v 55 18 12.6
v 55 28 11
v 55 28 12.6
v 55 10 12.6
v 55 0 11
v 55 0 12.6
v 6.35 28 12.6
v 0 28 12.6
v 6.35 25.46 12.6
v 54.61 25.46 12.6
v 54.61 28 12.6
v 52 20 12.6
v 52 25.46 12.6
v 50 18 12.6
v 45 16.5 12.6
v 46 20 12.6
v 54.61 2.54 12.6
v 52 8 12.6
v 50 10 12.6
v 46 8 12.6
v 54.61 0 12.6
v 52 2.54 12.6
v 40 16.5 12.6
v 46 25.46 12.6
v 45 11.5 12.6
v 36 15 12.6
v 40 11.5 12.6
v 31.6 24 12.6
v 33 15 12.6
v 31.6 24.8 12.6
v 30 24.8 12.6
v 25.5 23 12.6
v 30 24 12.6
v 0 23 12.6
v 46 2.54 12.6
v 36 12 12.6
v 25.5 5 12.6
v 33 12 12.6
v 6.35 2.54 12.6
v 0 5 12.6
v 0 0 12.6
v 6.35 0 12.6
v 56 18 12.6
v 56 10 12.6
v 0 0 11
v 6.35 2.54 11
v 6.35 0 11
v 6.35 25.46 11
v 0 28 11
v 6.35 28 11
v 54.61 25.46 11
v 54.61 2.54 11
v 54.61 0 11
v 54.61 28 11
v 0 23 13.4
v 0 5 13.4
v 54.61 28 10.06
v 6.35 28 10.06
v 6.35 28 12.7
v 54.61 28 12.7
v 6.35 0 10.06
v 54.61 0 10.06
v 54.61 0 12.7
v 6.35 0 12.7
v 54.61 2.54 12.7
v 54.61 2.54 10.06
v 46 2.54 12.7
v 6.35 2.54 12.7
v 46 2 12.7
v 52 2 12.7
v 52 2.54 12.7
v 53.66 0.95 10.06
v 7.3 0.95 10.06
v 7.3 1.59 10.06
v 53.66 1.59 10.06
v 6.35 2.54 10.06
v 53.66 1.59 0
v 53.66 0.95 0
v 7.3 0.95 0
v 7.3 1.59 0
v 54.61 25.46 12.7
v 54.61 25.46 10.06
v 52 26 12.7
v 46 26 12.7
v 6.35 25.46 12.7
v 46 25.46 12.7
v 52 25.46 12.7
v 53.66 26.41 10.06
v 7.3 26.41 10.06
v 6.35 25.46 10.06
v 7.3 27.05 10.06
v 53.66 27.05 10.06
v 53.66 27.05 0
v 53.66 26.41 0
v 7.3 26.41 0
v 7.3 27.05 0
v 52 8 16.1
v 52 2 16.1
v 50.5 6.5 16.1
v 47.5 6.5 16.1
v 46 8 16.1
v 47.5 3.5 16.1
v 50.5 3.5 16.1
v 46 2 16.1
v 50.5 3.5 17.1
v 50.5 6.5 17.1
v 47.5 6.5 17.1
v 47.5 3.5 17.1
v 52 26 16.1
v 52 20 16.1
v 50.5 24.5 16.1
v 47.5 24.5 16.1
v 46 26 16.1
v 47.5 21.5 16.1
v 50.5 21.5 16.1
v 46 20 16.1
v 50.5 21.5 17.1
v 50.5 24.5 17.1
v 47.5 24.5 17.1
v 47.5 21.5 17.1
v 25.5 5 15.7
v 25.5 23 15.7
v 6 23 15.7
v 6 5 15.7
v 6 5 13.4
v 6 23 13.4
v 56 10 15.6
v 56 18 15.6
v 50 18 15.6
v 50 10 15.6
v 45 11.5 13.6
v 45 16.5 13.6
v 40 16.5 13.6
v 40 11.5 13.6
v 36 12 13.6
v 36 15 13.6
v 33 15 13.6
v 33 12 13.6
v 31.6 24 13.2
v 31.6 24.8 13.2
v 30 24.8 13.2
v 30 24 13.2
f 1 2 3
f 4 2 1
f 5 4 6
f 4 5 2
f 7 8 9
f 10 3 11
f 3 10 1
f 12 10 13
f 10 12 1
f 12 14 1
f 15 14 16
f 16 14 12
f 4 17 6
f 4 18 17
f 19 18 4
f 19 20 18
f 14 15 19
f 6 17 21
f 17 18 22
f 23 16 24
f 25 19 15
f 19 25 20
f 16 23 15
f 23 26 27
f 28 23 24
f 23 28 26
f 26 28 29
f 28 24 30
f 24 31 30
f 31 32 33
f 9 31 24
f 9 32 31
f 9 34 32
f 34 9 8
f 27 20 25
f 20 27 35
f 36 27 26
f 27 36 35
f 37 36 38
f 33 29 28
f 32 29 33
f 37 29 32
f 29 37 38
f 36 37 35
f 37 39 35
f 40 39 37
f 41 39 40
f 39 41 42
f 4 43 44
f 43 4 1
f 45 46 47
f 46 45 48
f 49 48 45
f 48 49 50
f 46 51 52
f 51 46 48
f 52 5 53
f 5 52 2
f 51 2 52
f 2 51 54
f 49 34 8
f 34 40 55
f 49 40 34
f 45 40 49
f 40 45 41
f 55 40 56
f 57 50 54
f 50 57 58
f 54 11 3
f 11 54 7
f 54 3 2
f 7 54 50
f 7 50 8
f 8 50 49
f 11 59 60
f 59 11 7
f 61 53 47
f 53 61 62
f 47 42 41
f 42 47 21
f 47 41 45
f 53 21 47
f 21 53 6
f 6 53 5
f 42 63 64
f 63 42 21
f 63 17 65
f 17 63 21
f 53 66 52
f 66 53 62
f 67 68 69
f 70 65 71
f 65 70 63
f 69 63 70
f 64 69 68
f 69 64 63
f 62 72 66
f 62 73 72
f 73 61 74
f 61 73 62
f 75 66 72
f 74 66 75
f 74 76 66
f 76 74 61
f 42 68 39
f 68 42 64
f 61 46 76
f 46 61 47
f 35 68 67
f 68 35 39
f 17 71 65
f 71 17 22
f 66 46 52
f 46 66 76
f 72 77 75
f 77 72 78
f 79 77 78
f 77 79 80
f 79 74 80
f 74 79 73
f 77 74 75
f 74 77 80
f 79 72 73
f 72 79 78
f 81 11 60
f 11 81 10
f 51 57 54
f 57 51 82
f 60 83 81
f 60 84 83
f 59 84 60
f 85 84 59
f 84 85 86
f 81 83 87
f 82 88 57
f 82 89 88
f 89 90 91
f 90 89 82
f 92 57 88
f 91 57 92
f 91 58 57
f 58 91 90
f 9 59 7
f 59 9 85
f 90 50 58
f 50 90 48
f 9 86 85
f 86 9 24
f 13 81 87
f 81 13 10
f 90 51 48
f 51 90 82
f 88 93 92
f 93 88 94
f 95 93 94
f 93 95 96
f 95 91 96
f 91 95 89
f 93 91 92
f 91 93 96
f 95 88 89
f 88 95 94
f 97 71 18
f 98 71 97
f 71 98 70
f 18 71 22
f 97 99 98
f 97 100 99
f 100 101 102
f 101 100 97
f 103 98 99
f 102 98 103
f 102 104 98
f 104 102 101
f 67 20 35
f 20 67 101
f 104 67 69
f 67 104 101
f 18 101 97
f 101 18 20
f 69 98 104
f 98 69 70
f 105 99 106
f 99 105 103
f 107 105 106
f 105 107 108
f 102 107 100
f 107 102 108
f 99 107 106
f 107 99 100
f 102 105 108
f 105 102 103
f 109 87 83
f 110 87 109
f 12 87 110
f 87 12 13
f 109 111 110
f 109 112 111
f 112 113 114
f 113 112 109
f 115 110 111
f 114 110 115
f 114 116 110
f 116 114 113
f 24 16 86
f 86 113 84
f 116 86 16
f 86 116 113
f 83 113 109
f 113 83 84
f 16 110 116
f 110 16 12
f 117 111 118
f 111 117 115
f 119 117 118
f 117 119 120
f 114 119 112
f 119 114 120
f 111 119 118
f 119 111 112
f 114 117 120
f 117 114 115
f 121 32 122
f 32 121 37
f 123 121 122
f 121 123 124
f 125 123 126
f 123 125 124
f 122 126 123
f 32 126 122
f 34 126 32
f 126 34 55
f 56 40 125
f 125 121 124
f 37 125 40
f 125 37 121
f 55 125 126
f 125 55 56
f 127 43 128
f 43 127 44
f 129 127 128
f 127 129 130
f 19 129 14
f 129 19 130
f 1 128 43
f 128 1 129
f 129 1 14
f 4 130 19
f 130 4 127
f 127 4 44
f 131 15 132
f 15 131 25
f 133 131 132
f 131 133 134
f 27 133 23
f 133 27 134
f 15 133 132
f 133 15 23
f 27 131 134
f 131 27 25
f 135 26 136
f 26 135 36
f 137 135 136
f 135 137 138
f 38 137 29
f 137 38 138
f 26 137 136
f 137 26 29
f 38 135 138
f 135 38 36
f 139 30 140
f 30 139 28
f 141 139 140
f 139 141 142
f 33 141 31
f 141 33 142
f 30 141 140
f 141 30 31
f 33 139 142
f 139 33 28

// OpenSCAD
// file: ../board_common.scad
// What every board model here is made of: a PCB with holes, pin headers,
// chips and jacks, drawn from published dimensions. Nothing here is anyone's
// mesh; a board's outline, hole positions and connector placements are
// specifications the makers publish so that cases and shields can be made.
//
// Every board's origin is its PCB's front-left bottom corner (x right, y back,
// z up), with the PCB lying flat on z = 0 -- so a board placed at a node in
// a site sits on that node's floor, which is where a board sits on a bench.

pcb_t = 1.6;
pitch = 2.54;

module pcb(size, holes = [], hole_d = 3.2, col = "darkgreen") {
    color(col) difference() {
        cube([size.x, size.y, pcb_t]);
        for (h = holes) translate([h.x, h.y, -1]) cylinder(d = hole_d, h = pcb_t + 2, $fn = 16);
    }
}

// Pins are square posts that overlap what they stand in. OpenSCAD 2021.01
// exports a union with hexagonal pins, or with parts that only touch along
// an edge, as a mesh that is not closed -- and then drops it from any later
// union, silently. Every part here overlaps its neighbour by a little.
pin = 0.64;

// a row of `n` pins at the given start, along +x (or +y when `along_y`), with plastic bodies
module header(n, at, along_y = false, rows = 1, h = 8.5) {
    translate([at.x, at.y, pcb_t - 0.1]) rotate([0, 0, along_y ? 90 : 0]) translate([0, along_y ? -rows * pitch : 0, 0]) {
        color("black") cube([n * pitch, rows * pitch, h]);
        color("gold") for (i = [0 : n - 1]) for (r = [0 : rows - 1])
            translate([i * pitch + pitch / 2 - pin / 2, r * pitch + pitch / 2 - pin / 2, -3]) cube([pin, pin, h + 6]);
    }
}

// a row of `n` bare pins pointing down (a devkit standing on a breadboard).
// The pins are one gold strip, not n posts: n posts through a plastic bar
// under a PCB is a face with n holes, which OpenSCAD 2021.01 exports as a
// mesh CGAL will not read back. At bench scale a strip is a row of pins.
module pins_down(n, at, along_y = false, len = 11) {
    // one translate per solid, from the board's own frame: a chain of
    // translates with negative offsets rounds differently and the exporter
    // then writes a mesh CGAL will not read back (seen; not understood)
    rotate([0, 0, along_y ? 90 : 0]) {
        color("black") translate([at.x, at.y - pitch / 2, pcb_t - pitch]) cube([n * pitch, pitch, pitch + 0.1]);
        color("gold") translate([at.x + pitch / 2 - pin / 2, at.y - pin / 2, -len]) cube([(n - 1) * pitch + pin, pin, len + pcb_t - pitch + 0.2]);
    }
}

module chip(size, at, col = "black") { color(col) translate([at.x, at.y, pcb_t - 0.1]) cube([size.x, size.y, size.z + 0.1]); }

module usb_b(at) {           // a full-size USB-B jack, its face at the -x side
    color("silver") translate([at.x, at.y, pcb_t]) cube([16, 12, 11]);
}
module barrel_jack(at) {     // a 2.1 mm DC jack, its face at the -x side
    color("black") translate([at.x, at.y, pcb_t]) cube([14, 9, 11]);
}
module micro_usb(at, along_y = false) {
    color("silver") translate([at.x, at.y, pcb_t]) cube(along_y ? [8, 6, 3] : [6, 8, 3]);
}
module usb_c(at) { color("silver") translate([at.x, at.y, pcb_t]) cube([9, 7.5, 3.2]); }
module usb_a_stack(at) {     // two USB-A ports one above the other, the face at +x
    color("silver") translate([at.x, at.y, pcb_t]) cube([17.5, 13.2, 16]);
}
module rj45(at) { color("silver") translate([at.x, at.y, pcb_t]) cube([21.5, 16, 13.5]); }
module button(at) { color("silver") translate([at.x, at.y, pcb_t - 0.1]) cube([6, 6, 3.6]); color("black") translate([at.x + 1.5, at.y + 1.5, pcb_t + 3.4]) cube([3, 3, 1.1]); }
module crystal(at) { color("silver") translate([at.x, at.y, pcb_t]) cube([11, 4.5, 3.5]); }
module heatsink(at, size = [9, 9, 8]) { color("black") translate([at.x, at.y, pcb_t - 0.1]) cube([size.x, size.y, size.z + 4.1]); }
module screw_terminal(n, at, along_y = false) {
    translate([at.x, at.y, pcb_t]) rotate([0, 0, along_y ? 90 : 0]) color("mediumblue") cube([n * 5.08, 8, 10]);
}
module jst(n, at, along_y = false) {   // a JST-XH style header
    translate([at.x, at.y, pcb_t]) rotate([0, 0, along_y ? 90 : 0]) color("ivory") cube([n * 2.5 + 2.4, 5.8, 7]);
}
module sd_slot(at) { color("silver") translate([at.x, at.y, pcb_t]) cube([26, 28, 3]); }
// main file
// ESP32-DevKitC V4, from Espressif's published drawing: a 55 x 28 mm PCB, the
// ESP32-WROOM-32 module (18 x 25.5 mm, its antenna at the board's left end),
// two rows of nineteen pins at 0.1 in pitch, the micro-USB jack at the right
// end with the EN and BOOT buttons either side of it, the CP2102 bridge
// behind it. Drawn with its pins pointing down, as it stands on a breadboard
// -- and as the esp32_blink devkit stands on the garage bench.

include <../board_common.scad>

size = [55, 28];

module esp32_devkitc() {
    pcb(size, col = "black");
    // the module, its can and its antenna
    color("silver") translate([6, 5, pcb_t]) cube([19.5, 18, 3.1]);
    color("black") translate([0, 5, pcb_t]) cube([6, 18, 0.8]);
    pins_down(19, [6.35 + pitch / 2 - 1.27, 1.27]);
    pins_down(19, [6.35 + pitch / 2 - 1.27, 28 - 1.27]);
    micro_usb([55 - 5, 28 / 2 - 4]);
    button([46, 2]);
    button([46, 20]);
    chip([5, 5, 1], [40, 11.5]);          // the CP2102
    chip([3, 3, 1], [33, 12], "dimgray"); // the LDO
    chip([1.6, 0.8, 0.6], [30, 24], "red"); // the power LED
}

// standing on its pins, so the lowest point is the bench (z = 0)
translate([0, 0, 11]) esp32_devkitc();
